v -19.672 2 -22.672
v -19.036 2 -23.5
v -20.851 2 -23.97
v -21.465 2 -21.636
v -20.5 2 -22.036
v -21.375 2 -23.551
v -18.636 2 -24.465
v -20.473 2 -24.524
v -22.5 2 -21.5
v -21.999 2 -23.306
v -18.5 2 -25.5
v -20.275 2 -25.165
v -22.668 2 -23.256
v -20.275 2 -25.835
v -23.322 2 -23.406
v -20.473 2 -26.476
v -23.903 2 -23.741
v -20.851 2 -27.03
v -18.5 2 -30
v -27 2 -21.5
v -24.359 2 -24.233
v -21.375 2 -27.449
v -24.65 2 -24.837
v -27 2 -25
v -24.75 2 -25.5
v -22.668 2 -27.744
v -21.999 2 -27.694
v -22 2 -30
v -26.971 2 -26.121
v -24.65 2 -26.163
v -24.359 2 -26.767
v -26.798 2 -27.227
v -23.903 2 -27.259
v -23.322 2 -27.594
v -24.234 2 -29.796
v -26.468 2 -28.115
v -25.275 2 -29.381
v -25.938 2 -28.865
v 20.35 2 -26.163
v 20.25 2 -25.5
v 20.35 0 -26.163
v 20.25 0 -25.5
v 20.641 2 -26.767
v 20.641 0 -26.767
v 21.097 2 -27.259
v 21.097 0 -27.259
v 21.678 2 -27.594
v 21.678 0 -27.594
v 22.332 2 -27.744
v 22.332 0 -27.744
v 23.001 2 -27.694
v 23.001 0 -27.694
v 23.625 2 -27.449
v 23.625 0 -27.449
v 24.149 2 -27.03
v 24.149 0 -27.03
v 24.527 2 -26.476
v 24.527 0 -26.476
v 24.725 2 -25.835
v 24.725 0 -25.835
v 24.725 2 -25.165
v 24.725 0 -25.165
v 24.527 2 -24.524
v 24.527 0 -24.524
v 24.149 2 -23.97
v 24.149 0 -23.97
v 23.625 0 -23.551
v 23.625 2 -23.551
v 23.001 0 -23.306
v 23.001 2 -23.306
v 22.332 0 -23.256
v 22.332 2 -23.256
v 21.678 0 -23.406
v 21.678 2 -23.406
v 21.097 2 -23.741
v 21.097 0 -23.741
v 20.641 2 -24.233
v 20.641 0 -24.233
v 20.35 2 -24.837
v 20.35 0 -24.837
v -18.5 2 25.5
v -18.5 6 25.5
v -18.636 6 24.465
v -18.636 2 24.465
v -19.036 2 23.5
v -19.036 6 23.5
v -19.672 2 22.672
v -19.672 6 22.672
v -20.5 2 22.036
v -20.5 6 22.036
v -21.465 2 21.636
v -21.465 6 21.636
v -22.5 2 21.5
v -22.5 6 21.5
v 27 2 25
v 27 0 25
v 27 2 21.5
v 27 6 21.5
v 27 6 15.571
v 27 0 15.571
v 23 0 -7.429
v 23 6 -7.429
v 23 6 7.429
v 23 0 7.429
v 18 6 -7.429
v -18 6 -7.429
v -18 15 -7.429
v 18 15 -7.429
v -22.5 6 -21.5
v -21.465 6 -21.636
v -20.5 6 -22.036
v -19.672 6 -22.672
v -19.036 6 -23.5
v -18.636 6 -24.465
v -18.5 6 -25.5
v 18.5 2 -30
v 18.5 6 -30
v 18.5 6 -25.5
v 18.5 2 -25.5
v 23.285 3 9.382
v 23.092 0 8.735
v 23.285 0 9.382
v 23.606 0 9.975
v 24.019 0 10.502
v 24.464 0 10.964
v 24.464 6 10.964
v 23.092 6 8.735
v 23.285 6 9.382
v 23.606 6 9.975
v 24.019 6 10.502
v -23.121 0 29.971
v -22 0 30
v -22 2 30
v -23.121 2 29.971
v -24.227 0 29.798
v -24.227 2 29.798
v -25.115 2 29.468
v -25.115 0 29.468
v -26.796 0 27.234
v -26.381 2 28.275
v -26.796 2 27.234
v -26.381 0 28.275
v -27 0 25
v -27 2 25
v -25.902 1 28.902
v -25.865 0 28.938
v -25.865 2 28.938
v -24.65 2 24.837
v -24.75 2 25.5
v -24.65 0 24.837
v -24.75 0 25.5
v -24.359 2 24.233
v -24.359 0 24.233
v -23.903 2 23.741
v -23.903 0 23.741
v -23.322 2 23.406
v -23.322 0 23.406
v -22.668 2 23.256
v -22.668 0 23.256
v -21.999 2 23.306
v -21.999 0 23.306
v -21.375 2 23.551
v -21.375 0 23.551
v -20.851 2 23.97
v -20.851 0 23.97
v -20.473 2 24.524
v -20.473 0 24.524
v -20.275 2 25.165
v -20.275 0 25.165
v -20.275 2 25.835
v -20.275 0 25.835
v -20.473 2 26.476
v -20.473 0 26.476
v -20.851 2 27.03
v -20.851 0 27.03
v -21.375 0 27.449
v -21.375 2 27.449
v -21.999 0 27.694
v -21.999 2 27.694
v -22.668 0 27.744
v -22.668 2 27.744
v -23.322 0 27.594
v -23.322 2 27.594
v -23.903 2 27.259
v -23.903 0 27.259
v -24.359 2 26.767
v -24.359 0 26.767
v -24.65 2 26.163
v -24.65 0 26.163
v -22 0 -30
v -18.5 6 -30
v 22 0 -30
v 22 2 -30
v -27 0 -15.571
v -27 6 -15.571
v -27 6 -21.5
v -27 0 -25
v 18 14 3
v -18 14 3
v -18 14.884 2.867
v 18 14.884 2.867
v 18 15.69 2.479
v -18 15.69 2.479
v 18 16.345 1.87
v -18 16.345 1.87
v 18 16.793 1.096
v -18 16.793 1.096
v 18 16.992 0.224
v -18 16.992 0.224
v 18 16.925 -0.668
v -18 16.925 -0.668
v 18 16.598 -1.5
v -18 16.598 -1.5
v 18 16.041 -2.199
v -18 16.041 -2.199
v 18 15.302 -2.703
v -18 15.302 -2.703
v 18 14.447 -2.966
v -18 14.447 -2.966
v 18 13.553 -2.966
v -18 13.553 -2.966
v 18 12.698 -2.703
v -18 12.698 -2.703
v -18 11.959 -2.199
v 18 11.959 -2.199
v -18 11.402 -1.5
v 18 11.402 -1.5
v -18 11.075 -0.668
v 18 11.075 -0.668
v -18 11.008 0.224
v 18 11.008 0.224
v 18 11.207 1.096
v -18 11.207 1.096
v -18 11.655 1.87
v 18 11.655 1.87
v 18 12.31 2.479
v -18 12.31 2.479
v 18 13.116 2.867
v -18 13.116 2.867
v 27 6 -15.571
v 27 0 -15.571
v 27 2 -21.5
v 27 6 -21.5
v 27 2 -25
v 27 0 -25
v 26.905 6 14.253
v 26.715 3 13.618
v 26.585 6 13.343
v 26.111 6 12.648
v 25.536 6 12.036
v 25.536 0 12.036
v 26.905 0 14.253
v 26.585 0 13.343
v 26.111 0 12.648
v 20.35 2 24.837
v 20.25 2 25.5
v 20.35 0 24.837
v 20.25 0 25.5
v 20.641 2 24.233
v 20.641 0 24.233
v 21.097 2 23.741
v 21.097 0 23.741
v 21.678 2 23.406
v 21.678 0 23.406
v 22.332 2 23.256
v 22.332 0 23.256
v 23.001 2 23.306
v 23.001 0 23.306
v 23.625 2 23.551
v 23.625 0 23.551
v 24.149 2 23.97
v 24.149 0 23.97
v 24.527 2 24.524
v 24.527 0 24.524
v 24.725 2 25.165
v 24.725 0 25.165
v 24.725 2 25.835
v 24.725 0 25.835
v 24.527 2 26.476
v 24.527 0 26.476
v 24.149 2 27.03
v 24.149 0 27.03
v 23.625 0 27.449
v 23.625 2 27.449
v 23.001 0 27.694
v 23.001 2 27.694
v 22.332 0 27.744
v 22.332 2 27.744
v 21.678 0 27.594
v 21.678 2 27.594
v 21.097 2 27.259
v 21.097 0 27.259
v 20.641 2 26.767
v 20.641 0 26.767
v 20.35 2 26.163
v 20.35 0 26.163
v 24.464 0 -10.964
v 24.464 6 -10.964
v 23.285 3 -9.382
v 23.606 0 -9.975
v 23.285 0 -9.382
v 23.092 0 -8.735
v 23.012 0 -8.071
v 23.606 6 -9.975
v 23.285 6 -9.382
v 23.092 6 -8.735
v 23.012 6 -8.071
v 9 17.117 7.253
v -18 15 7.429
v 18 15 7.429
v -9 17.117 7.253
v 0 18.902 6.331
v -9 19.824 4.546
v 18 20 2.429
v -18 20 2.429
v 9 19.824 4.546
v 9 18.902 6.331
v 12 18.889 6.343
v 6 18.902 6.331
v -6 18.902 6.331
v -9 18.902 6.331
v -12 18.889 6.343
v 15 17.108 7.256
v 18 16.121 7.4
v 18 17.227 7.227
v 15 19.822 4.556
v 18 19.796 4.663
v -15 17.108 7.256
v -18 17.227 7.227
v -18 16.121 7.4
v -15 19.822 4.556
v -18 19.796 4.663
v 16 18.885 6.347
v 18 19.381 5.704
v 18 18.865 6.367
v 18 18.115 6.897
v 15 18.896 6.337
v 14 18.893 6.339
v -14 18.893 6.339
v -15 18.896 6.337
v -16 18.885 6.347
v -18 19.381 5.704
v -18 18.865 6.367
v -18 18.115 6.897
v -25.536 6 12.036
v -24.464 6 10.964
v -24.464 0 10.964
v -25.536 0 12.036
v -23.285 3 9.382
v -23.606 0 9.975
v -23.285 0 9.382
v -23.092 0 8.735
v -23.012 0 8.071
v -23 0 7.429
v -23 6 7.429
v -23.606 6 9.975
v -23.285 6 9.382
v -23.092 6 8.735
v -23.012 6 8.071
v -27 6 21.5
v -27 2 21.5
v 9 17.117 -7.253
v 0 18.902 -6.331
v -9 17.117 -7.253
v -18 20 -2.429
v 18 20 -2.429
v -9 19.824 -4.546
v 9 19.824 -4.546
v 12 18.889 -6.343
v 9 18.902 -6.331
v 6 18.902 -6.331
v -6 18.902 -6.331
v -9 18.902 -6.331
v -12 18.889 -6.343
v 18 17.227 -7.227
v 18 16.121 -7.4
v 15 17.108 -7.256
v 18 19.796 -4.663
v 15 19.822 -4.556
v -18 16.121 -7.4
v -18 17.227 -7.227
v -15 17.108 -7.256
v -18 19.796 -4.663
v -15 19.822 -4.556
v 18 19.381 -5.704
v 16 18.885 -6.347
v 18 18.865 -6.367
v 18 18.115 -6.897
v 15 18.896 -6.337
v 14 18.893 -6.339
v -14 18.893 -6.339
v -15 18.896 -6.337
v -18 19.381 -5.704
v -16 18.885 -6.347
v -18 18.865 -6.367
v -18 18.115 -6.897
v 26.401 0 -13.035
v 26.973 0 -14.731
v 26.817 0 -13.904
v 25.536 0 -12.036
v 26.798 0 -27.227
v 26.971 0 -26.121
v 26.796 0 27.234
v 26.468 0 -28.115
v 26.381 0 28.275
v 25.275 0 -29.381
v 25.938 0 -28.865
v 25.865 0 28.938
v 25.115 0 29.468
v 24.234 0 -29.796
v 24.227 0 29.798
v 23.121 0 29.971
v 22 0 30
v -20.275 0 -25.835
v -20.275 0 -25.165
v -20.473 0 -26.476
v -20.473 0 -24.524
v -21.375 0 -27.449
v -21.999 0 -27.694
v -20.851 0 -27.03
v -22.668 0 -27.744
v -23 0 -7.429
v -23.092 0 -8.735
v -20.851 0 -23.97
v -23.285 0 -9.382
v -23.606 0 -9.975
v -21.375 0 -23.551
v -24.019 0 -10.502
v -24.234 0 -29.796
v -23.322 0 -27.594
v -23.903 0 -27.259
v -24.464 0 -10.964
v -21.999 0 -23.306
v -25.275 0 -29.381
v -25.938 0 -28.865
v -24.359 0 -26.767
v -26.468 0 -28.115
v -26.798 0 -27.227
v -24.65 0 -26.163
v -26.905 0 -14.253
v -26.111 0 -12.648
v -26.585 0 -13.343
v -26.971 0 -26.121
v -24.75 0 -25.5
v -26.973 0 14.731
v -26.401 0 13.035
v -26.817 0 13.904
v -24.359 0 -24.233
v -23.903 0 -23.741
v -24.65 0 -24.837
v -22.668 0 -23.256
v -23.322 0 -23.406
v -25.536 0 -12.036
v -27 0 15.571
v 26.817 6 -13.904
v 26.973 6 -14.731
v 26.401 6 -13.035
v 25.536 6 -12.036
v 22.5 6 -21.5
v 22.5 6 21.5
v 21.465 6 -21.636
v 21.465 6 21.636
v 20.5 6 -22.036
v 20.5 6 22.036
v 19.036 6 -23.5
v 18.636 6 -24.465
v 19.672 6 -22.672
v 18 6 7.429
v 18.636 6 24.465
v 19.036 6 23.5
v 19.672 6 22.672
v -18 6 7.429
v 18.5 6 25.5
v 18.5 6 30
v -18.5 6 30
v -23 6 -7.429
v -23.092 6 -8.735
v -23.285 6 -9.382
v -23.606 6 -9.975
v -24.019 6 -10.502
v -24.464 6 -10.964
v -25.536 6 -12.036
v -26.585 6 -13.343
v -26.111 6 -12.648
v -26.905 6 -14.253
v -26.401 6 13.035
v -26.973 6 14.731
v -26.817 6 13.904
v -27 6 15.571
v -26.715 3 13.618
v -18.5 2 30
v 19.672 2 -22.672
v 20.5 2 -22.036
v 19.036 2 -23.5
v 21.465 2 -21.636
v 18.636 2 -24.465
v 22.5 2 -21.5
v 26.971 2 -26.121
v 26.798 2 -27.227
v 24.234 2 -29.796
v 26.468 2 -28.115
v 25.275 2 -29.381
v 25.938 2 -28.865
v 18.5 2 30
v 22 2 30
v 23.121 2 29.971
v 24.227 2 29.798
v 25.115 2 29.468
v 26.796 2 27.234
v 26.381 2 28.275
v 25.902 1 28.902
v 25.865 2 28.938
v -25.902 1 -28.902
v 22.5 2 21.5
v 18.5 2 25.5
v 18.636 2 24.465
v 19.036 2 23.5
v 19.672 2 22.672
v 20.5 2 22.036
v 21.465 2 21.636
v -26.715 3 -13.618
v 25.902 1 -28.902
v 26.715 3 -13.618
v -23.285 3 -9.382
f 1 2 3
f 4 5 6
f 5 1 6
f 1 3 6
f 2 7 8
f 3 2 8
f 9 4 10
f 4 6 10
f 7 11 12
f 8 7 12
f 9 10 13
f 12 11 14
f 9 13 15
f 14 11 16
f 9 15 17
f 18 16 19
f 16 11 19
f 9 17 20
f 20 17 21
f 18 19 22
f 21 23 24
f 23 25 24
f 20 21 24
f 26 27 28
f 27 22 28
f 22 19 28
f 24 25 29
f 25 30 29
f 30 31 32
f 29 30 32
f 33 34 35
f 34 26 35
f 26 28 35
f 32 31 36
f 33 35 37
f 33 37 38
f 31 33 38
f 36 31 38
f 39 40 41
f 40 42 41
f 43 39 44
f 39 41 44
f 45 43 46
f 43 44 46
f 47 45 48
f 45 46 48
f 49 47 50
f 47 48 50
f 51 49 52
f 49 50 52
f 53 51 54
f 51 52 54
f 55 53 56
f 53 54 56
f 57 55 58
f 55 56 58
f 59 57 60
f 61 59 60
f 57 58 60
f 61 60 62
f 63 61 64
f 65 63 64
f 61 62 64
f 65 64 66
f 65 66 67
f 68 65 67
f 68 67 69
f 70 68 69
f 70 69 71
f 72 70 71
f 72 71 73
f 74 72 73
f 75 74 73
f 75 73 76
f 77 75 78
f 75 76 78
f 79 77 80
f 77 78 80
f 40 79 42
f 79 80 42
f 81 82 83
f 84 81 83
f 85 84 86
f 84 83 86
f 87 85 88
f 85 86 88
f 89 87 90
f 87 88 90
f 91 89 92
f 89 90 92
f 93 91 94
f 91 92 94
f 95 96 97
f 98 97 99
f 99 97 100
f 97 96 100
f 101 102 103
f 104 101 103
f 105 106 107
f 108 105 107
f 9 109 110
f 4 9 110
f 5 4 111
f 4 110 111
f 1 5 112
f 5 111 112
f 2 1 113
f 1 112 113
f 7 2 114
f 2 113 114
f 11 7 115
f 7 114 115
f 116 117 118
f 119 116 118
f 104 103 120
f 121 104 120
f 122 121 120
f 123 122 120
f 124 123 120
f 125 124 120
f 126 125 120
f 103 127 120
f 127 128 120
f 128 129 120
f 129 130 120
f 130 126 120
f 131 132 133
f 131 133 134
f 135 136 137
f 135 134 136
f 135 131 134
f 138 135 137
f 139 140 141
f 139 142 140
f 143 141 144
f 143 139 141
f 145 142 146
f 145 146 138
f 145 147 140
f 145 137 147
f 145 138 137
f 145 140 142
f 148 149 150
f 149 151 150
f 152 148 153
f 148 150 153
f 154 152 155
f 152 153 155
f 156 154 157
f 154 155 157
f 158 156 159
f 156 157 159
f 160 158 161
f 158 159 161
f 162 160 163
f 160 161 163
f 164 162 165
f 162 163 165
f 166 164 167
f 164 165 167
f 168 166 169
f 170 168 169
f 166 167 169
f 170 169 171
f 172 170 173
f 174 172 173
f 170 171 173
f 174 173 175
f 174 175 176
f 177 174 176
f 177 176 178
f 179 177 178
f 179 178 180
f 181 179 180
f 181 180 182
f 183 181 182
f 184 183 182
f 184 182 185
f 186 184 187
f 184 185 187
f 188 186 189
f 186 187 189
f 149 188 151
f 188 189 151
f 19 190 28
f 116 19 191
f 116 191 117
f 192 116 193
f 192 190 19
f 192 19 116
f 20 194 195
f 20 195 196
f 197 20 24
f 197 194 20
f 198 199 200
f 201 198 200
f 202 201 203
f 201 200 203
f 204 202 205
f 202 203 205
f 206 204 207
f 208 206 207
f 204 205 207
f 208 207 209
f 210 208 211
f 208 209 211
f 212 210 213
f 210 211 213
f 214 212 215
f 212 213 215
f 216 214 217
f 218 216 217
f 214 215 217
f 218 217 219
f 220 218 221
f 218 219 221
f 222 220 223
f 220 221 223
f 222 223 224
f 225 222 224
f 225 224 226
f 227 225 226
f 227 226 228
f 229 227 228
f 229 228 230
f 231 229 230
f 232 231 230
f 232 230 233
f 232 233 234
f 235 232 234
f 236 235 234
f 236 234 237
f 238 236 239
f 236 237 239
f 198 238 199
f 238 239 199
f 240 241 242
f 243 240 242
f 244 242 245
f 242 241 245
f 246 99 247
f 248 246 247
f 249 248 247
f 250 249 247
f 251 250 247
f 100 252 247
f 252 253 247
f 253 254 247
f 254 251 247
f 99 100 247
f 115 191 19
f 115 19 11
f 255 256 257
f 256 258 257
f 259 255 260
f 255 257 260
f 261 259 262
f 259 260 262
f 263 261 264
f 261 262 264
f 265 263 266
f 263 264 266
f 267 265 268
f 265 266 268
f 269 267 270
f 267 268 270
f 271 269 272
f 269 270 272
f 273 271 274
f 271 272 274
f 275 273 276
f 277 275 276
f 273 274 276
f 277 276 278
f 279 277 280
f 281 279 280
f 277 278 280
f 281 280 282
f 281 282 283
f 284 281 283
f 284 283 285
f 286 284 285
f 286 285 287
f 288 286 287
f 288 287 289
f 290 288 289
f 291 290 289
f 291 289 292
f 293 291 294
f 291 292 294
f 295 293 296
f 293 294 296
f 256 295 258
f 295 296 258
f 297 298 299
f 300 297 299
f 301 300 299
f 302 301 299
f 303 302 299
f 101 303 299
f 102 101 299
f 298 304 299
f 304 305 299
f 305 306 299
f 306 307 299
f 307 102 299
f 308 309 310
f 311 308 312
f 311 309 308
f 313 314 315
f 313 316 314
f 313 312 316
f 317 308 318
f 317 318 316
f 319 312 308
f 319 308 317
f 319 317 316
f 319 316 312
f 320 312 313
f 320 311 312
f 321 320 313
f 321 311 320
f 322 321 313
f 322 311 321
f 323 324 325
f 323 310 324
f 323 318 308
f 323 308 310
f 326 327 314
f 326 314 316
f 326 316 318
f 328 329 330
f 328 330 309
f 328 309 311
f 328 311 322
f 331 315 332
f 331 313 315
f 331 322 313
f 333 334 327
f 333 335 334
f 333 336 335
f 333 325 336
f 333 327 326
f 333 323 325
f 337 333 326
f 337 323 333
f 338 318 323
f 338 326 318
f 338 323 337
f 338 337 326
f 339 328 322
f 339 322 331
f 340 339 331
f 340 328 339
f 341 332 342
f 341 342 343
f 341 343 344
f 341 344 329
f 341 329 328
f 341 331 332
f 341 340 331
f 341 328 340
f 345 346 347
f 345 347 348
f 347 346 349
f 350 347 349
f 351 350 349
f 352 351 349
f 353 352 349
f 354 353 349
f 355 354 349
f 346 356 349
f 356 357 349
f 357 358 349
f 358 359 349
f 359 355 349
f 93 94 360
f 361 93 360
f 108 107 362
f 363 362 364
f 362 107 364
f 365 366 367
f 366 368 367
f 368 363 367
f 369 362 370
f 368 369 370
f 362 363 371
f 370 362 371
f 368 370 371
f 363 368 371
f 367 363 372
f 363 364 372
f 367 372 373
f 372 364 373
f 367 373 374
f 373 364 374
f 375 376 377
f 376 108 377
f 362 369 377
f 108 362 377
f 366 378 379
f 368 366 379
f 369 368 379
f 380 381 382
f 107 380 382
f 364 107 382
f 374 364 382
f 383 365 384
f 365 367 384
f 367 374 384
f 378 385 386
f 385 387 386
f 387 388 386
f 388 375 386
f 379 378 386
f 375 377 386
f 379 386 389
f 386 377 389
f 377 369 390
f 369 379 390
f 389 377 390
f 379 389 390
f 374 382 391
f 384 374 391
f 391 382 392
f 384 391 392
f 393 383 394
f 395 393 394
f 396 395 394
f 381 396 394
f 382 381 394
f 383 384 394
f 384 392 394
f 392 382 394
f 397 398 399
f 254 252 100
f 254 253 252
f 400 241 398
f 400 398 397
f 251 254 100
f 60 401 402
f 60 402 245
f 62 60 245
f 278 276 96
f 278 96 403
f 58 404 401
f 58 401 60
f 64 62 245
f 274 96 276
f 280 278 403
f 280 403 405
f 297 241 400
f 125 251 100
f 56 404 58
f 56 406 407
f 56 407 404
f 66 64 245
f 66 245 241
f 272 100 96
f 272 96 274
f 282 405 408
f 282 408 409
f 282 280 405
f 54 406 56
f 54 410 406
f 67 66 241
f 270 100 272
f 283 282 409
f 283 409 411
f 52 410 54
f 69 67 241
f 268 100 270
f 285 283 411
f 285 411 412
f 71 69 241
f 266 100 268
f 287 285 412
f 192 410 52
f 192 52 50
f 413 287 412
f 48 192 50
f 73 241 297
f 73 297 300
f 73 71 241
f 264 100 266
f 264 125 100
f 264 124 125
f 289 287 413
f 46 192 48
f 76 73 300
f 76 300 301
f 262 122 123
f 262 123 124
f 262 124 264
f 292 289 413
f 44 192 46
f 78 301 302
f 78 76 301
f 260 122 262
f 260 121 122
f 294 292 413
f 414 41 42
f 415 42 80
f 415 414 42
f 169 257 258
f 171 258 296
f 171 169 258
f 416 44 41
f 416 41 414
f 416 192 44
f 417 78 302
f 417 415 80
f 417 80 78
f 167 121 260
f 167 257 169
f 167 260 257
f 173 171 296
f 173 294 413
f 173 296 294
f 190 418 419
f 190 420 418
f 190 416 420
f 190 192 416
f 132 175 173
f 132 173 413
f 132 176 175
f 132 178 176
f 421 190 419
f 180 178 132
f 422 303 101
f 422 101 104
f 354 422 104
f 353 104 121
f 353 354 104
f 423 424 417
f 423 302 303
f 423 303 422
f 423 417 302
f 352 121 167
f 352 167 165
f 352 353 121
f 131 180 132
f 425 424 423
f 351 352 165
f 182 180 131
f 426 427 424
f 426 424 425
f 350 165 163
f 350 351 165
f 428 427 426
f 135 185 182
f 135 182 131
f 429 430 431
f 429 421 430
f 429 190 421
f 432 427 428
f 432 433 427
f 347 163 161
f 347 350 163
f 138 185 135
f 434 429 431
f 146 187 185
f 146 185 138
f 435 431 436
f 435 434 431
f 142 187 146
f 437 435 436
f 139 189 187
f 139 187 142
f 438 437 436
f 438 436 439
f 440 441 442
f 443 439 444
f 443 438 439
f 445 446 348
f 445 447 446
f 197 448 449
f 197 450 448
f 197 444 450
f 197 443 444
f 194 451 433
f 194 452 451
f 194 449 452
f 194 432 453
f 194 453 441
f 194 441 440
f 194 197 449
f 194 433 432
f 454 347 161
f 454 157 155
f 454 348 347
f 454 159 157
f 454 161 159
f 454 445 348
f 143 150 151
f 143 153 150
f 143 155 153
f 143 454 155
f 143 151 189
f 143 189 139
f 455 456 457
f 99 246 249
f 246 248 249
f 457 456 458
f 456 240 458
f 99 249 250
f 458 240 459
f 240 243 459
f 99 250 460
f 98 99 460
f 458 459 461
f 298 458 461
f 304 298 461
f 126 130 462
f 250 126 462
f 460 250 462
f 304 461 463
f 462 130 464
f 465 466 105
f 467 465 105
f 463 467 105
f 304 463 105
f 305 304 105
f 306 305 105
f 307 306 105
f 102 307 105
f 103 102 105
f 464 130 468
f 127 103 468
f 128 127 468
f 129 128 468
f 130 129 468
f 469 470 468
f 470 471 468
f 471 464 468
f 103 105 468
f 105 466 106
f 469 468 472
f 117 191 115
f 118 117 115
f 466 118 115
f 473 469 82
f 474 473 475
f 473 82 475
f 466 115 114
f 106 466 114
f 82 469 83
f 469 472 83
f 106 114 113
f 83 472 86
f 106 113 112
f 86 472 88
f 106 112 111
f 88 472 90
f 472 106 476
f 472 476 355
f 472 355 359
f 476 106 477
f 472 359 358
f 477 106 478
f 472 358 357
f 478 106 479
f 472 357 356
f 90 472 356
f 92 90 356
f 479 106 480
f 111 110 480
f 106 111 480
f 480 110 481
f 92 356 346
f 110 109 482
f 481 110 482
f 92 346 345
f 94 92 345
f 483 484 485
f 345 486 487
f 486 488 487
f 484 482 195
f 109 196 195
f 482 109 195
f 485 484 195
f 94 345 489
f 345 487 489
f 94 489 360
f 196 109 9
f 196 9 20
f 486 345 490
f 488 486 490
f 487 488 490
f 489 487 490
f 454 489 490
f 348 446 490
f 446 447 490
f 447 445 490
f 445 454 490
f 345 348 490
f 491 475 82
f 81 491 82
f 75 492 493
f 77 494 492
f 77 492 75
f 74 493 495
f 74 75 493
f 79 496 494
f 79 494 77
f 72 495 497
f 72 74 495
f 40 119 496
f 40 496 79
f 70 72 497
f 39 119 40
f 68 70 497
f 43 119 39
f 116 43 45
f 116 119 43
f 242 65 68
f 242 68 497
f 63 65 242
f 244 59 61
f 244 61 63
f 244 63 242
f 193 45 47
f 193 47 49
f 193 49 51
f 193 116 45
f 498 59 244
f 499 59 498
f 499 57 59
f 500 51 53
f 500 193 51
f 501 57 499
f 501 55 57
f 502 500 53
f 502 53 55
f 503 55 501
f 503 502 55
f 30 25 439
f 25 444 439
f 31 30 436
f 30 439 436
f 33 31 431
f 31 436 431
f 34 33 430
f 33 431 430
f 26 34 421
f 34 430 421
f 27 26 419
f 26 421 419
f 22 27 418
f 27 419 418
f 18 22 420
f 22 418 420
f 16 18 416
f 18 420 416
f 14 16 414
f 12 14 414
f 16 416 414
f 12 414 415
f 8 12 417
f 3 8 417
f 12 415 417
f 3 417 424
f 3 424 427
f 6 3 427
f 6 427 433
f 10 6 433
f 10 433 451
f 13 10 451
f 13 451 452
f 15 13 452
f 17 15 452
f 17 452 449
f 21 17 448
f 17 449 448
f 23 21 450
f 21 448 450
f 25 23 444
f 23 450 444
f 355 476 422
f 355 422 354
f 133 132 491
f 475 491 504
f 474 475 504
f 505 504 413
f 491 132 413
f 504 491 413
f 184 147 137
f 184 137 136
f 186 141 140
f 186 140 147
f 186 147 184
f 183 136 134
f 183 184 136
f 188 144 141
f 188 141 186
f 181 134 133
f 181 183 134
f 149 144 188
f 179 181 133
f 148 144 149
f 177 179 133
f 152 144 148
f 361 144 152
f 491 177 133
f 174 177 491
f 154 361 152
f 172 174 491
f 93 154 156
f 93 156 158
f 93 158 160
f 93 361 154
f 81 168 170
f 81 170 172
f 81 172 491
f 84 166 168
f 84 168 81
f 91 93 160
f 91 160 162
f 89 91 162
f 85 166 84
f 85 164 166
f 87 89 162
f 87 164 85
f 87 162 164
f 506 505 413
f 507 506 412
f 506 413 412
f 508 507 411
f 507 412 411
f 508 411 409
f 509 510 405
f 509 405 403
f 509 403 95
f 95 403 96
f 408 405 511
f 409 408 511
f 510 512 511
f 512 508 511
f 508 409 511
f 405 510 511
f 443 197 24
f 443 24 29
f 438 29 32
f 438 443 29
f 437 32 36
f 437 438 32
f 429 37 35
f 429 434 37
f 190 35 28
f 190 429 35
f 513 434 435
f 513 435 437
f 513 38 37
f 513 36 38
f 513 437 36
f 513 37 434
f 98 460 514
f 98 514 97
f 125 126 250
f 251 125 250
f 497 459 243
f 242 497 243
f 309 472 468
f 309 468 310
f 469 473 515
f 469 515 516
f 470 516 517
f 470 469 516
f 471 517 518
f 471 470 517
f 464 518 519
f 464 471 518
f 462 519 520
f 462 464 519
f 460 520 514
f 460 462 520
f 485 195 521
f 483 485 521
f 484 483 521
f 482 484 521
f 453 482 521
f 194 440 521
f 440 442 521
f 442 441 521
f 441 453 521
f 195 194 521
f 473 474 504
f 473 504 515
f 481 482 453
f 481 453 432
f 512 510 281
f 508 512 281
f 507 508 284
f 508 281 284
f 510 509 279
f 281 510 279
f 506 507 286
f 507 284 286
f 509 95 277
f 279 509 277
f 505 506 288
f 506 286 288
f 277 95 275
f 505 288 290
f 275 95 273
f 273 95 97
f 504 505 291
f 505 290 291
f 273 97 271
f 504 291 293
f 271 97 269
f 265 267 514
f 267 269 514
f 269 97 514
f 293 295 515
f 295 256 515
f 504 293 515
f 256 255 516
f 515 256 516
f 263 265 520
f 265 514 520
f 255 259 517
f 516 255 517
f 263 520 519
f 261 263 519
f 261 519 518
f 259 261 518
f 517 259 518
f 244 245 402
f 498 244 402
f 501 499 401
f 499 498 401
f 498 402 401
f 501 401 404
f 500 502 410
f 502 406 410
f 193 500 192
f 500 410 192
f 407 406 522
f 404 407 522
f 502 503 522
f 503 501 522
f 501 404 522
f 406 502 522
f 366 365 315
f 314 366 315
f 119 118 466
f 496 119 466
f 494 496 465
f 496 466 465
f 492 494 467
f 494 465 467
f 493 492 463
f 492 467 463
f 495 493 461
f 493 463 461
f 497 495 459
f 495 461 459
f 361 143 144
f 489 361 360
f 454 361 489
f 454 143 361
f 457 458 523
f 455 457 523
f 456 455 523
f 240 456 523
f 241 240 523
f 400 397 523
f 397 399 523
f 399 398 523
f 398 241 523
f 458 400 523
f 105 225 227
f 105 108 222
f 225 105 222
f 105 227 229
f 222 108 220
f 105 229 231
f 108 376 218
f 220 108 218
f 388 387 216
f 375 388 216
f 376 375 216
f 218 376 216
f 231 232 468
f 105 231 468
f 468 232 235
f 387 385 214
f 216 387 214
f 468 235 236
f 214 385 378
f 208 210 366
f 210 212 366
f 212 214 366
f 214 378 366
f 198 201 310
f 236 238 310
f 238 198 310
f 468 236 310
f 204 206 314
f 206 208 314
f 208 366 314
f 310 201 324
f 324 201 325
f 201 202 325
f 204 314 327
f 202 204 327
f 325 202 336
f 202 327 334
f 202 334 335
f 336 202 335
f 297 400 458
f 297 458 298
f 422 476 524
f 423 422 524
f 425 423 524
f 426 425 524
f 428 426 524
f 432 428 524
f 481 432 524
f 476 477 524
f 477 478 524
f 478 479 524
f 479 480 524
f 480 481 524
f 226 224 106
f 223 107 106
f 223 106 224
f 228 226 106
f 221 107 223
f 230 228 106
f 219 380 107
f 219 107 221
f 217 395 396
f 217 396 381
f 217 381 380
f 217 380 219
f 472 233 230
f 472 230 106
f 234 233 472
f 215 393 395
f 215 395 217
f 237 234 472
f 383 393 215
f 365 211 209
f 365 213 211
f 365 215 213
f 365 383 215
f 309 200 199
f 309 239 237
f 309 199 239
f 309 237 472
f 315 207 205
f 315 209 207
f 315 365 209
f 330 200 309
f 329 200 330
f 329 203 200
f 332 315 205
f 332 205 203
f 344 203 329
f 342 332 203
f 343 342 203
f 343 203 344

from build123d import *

# Parameters (mm, degrees)
SKETCH1_W                      = 54
SKETCH1_H                      = 60
BOSS_EXTRUDE1_DEPTH            = 6
CBORE_FOR_M4_SHCS1_D           = 4.5
CBORE_FOR_M4_SHCS1_DEPTH       = 12.4
CBORE_FOR_M4_SHCS1_CBORE_D     = 8
CBORE_FOR_M4_SHCS1_CBORE_DEPTH = 4
CBORE_FOR_M4_SHCS1_TIP         = 1.351936393
CUT_EXTRUDE1_DEPTH             = 4
FILLET1_SIZE                   = 5
CUT_EXTRUDE2_DEPTH             = 41.804411681
BOSS_EXTRUDE2_START            = -5
SKETCH6_W                      = 14.857864376
SKETCH6_H                      = 14
SKETCH6_R                      = 3
BOSS_EXTRUDE2_DEPTH            = 36
FILLET3_SIZE                   = 5


with BuildPart() as part:
    # Sketch1 → Boss-Extrude1 (new body)
    with BuildSketch(Plane(origin=(0, 0, 0), x_dir=(1, 0, 0), z_dir=(0, 1, 0))):
        Rectangle(SKETCH1_W, SKETCH1_H)
    extrude(amount=BOSS_EXTRUDE1_DEPTH)

    # CBORE for M4 SHCS1
    with Locations(Plane(origin=(0, 6, 0), x_dir=(1, 0, 0), z_dir=(0, 1, 0))):
        with Locations((-22.5, 25.5), (-22.5, -25.5), (22.5, -25.5), (22.5, 25.5)):
            CounterBoreHole(CBORE_FOR_M4_SHCS1_D / 2, CBORE_FOR_M4_SHCS1_CBORE_D / 2, CBORE_FOR_M4_SHCS1_CBORE_DEPTH, depth=CBORE_FOR_M4_SHCS1_DEPTH)
            with Locations((0, 0, -(CBORE_FOR_M4_SHCS1_DEPTH + CBORE_FOR_M4_SHCS1_TIP / 2))):  # 118° drill point
                Cone(0, CBORE_FOR_M4_SHCS1_D / 2, CBORE_FOR_M4_SHCS1_TIP, mode=Mode.SUBTRACT)

    # Sketch4 → Cut-Extrude1 (cut)
    with BuildSketch(Plane(origin=(0, 6, 0), x_dir=(1, 0, 0), z_dir=(0, 1, 0))):
        with BuildLine():
            Line((-22.5, 21.5), (-27, 21.5))
            Line((-27, 21.5), (-27, 30))
            Line((-27, 30), (-18.5, 30))
            Line((-18.5, 30), (-18.5, 25.5))
            ThreePointArc((-18.5, 25.5), (-19.671572875, 22.671572875), (-22.5, 21.5))
        make_face()
        with BuildLine():
            Line((22.5, 21.5), (27, 21.5))
            Line((27, 21.5), (27, 30))
            Line((27, 30), (18.5, 30))
            Line((18.5, 30), (18.5, 25.5))
            ThreePointArc((18.5, 25.5), (19.671572875, 22.671572875), (22.5, 21.5))
        make_face()
        with BuildLine():
            Line((18.5, -30), (18.5, -25.5))
            ThreePointArc((18.5, -25.5), (19.671572875, -22.671572875), (22.5, -21.5))
            Line((22.5, -21.5), (27, -21.5))
            Line((27, -21.5), (27, -30))
            Line((27, -30), (18.5, -30))
        make_face()
        with BuildLine():
            Line((-18.5, -30), (-18.5, -25.5))
            ThreePointArc((-18.5, -25.5), (-19.671572875, -22.671572875), (-22.5, -21.5))
            Line((-22.5, -21.5), (-27, -21.5))
            Line((-27, -21.5), (-27, -30))
            Line((-27, -30), (-18.5, -30))
        make_face()
    extrude(amount=-CUT_EXTRUDE1_DEPTH, mode=Mode.SUBTRACT)

    # Fillet1
    # a fillet whose section is not a circle: 5 mm, written as the material it takes off along each edge
    with BuildSketch(Plane(origin=(27, -12.5, -30), x_dir=(0, 0, 1), z_dir=(0, 1, 0)), Plane(origin=(27, -12.5, 30), x_dir=(-1, 0, 0), z_dir=(0, 1, 0))) as fillet1_piece_1:
        with BuildLine():
            add(Edge.make_bspline([(FILLET1_SIZE, 0), (FILLET1_SIZE * 0.831801948466, 0), (FILLET1_SIZE * 0.663603896932, 0), (FILLET1_SIZE * 0.292893218813, -FILLET1_SIZE * 0.0716919198361), (FILLET1_SIZE * 0.0716919198361, -FILLET1_SIZE * 0.292893218813), (0, -FILLET1_SIZE * 0.663603896932), (0, -FILLET1_SIZE * 0.831801948466), (0, -FILLET1_SIZE)], knots=[0, 0, 0, 0, 0, 0, 0.5, 0.5, 1, 1, 1, 1, 1, 1], degree=5))
            Line((0, -FILLET1_SIZE), (0, 0))
            Line((0, 0), (FILLET1_SIZE, 0))
        make_face()
    extrude(amount=27, mode=Mode.SUBTRACT)
    with BuildSketch(Plane(origin=(-27, -12.5, -30), x_dir=(0, 0, 1), z_dir=(0, 1, 0)), Plane(origin=(-27, -12.5, 30), x_dir=(1, 0, 0), z_dir=(0, 1, 0))) as fillet1_piece_2:
        with BuildLine():
            add(Edge.make_bspline([(FILLET1_SIZE, 0), (FILLET1_SIZE * 0.831801948466, 0), (FILLET1_SIZE * 0.663603896932, 0), (FILLET1_SIZE * 0.292893218813, FILLET1_SIZE * 0.0716919198361), (FILLET1_SIZE * 0.0716919198361, FILLET1_SIZE * 0.292893218813), (0, FILLET1_SIZE * 0.663603896932), (0, FILLET1_SIZE * 0.831801948466), (0, FILLET1_SIZE)], knots=[0, 0, 0, 0, 0, 0, 0.5, 0.5, 1, 1, 1, 1, 1, 1], degree=5))
            Line((0, FILLET1_SIZE), (0, 0))
            Line((0, 0), (FILLET1_SIZE, 0))
        make_face()
    extrude(amount=27, mode=Mode.SUBTRACT)

    # Sketch5 → Cut-Extrude2 (cut, through all)
    with BuildSketch(Plane(origin=(0, 6, 0), x_dir=(1, 0, 0), z_dir=(0, 1, 0))):
        Polygon((-27, 13.5), (-23, 9.5), (-23, -9.5), (-27, -13.5), align=None)
        Polygon((27, 13.5), (23, 9.5), (23, -9.5), (27, -13.5), align=None)
    extrude(amount=-CUT_EXTRUDE2_DEPTH, mode=Mode.SUBTRACT)

    # Fillet2
    # a fillet whose section is not a circle: 5 mm, written as the material it adds along each edge
    with BuildSketch(Plane(origin=(-23, 6, 9.5), x_dir=(-0.7071067811865389, 0, 0.7071067811865561), z_dir=(0, -1, 0)), Plane(origin=(23, 6, 9.5), x_dir=(0, 0, -1), z_dir=(0, -1, 0)), Plane(origin=(23, 6, -9.5), x_dir=(0.707106781186557, 0, -0.7071067811865381), z_dir=(0, -1, 0)), Plane(origin=(-23, 6, -9.5), x_dir=(0, 0, 1), z_dir=(0, -1, 0))) as fillet2_piece_1:
        with BuildLine():
            add(Edge.make_bspline([(2.071067812, 0), (1.691961313, 0), (1.312854813, 0), (0.467093497, 0.07115949), (-0.279967621, 0.380602337), (-0.928328541, 0.928328541), (-1.196397318, 1.196397318), (-1.464466094, 1.464466094)], knots=[0, 0, 0, 0, 0, 0, 0.5, 0.5, 1, 1, 1, 1, 1, 1], degree=5))
            Line((-1.464466094, 1.464466094), (0, 0))
            Line((0, 0), (2.071067812, 0))
        make_face()
    extrude(amount=6)
    # a fillet whose section is not a circle: 5 mm, written as the material it takes off along each edge
    with BuildSketch(Plane(origin=(27, 11.17766953, 13.5), x_dir=(-0.7071067811865385, 0, -0.7071067811865565), z_dir=(0, -1, 0)), Plane(origin=(27, 11.17766953, -13.5), x_dir=(0, 0, -1), z_dir=(0, -1, 0)), Plane(origin=(-27, 11.17766953, 13.5), x_dir=(0, 0, 1), z_dir=(0, -1, 0)), Plane(origin=(-27, 11.17766953, -13.5), x_dir=(0.7071067811865569, 0, 0.707106781186538), z_dir=(0, -1, 0))) as fillet2_2_piece_1:
        with BuildLine():
            add(Edge.make_bspline([(2.071067812, 0), (1.691961313, 0), (1.312854813, 0), (0.467093497, -0.07115949), (-0.279967621, -0.380602337), (-0.928328541, -0.928328541), (-1.196397318, -1.196397318), (-1.464466094, -1.464466094)], knots=[0, 0, 0, 0, 0, 0, 0.5, 0.5, 1, 1, 1, 1, 1, 1], degree=5))
            Line((-1.464466094, -1.464466094), (0, 0))
            Line((0, 0), (2.071067812, 0))
        make_face()
    extrude(amount=16.355339059, mode=Mode.SUBTRACT)

    # Sketch6 → Boss-Extrude2 (add)
    with BuildSketch(Plane.ZY.offset(23).offset(BOSS_EXTRUDE2_START)):
        with Locations((0, 13)):
            Rectangle(SKETCH6_W, SKETCH6_H)
        with Locations((0, 14)):
            Circle(SKETCH6_R, mode=Mode.SUBTRACT)
    extrude(amount=-BOSS_EXTRUDE2_DEPTH)

    # Fillet3
    # a fillet whose section is not a circle: 5 mm, written as the material it takes off along each edge
    with BuildSketch(Plane(origin=(-30.5, 20, -7.428932188), x_dir=(0, -1, 0), z_dir=(1, 0, 0))) as fillet3_piece_1:
        with BuildLine():
            add(Edge.make_bspline([(FILLET3_SIZE, 0), (FILLET3_SIZE * 0.831801948466, 0), (FILLET3_SIZE * 0.663603896932, 0), (FILLET3_SIZE * 0.292893218813, -FILLET3_SIZE * 0.0716919198361), (FILLET3_SIZE * 0.0716919198361, -FILLET3_SIZE * 0.292893218813), (0, -FILLET3_SIZE * 0.663603896932), (0, -FILLET3_SIZE * 0.831801948466), (0, -FILLET3_SIZE)], knots=[0, 0, 0, 0, 0, 0, 0.5, 0.5, 1, 1, 1, 1, 1, 1], degree=5))
            Line((0, -FILLET3_SIZE), (0, 0))
            Line((0, 0), (FILLET3_SIZE, 0))
        make_face()
    extrude(amount=61, mode=Mode.SUBTRACT)
    with BuildSketch(Plane(origin=(-30.5, 20, 7.428932188), x_dir=(0, -1, 0), z_dir=(1, 0, 0))) as fillet3_piece_2:
        with BuildLine():
            add(Edge.make_bspline([(FILLET3_SIZE, 0), (FILLET3_SIZE * 0.831801948466, 0), (FILLET3_SIZE * 0.663603896932, 0), (FILLET3_SIZE * 0.292893218813, FILLET3_SIZE * 0.0716919198361), (FILLET3_SIZE * 0.0716919198361, FILLET3_SIZE * 0.292893218813), (0, FILLET3_SIZE * 0.663603896932), (0, FILLET3_SIZE * 0.831801948466), (0, FILLET3_SIZE)], knots=[0, 0, 0, 0, 0, 0, 0.5, 0.5, 1, 1, 1, 1, 1, 1], degree=5))
            Line((0, FILLET3_SIZE), (0, 0))
            Line((0, 0), (FILLET3_SIZE, 0))
        make_face()
    extrude(amount=61, mode=Mode.SUBTRACT)


solid = part.part
